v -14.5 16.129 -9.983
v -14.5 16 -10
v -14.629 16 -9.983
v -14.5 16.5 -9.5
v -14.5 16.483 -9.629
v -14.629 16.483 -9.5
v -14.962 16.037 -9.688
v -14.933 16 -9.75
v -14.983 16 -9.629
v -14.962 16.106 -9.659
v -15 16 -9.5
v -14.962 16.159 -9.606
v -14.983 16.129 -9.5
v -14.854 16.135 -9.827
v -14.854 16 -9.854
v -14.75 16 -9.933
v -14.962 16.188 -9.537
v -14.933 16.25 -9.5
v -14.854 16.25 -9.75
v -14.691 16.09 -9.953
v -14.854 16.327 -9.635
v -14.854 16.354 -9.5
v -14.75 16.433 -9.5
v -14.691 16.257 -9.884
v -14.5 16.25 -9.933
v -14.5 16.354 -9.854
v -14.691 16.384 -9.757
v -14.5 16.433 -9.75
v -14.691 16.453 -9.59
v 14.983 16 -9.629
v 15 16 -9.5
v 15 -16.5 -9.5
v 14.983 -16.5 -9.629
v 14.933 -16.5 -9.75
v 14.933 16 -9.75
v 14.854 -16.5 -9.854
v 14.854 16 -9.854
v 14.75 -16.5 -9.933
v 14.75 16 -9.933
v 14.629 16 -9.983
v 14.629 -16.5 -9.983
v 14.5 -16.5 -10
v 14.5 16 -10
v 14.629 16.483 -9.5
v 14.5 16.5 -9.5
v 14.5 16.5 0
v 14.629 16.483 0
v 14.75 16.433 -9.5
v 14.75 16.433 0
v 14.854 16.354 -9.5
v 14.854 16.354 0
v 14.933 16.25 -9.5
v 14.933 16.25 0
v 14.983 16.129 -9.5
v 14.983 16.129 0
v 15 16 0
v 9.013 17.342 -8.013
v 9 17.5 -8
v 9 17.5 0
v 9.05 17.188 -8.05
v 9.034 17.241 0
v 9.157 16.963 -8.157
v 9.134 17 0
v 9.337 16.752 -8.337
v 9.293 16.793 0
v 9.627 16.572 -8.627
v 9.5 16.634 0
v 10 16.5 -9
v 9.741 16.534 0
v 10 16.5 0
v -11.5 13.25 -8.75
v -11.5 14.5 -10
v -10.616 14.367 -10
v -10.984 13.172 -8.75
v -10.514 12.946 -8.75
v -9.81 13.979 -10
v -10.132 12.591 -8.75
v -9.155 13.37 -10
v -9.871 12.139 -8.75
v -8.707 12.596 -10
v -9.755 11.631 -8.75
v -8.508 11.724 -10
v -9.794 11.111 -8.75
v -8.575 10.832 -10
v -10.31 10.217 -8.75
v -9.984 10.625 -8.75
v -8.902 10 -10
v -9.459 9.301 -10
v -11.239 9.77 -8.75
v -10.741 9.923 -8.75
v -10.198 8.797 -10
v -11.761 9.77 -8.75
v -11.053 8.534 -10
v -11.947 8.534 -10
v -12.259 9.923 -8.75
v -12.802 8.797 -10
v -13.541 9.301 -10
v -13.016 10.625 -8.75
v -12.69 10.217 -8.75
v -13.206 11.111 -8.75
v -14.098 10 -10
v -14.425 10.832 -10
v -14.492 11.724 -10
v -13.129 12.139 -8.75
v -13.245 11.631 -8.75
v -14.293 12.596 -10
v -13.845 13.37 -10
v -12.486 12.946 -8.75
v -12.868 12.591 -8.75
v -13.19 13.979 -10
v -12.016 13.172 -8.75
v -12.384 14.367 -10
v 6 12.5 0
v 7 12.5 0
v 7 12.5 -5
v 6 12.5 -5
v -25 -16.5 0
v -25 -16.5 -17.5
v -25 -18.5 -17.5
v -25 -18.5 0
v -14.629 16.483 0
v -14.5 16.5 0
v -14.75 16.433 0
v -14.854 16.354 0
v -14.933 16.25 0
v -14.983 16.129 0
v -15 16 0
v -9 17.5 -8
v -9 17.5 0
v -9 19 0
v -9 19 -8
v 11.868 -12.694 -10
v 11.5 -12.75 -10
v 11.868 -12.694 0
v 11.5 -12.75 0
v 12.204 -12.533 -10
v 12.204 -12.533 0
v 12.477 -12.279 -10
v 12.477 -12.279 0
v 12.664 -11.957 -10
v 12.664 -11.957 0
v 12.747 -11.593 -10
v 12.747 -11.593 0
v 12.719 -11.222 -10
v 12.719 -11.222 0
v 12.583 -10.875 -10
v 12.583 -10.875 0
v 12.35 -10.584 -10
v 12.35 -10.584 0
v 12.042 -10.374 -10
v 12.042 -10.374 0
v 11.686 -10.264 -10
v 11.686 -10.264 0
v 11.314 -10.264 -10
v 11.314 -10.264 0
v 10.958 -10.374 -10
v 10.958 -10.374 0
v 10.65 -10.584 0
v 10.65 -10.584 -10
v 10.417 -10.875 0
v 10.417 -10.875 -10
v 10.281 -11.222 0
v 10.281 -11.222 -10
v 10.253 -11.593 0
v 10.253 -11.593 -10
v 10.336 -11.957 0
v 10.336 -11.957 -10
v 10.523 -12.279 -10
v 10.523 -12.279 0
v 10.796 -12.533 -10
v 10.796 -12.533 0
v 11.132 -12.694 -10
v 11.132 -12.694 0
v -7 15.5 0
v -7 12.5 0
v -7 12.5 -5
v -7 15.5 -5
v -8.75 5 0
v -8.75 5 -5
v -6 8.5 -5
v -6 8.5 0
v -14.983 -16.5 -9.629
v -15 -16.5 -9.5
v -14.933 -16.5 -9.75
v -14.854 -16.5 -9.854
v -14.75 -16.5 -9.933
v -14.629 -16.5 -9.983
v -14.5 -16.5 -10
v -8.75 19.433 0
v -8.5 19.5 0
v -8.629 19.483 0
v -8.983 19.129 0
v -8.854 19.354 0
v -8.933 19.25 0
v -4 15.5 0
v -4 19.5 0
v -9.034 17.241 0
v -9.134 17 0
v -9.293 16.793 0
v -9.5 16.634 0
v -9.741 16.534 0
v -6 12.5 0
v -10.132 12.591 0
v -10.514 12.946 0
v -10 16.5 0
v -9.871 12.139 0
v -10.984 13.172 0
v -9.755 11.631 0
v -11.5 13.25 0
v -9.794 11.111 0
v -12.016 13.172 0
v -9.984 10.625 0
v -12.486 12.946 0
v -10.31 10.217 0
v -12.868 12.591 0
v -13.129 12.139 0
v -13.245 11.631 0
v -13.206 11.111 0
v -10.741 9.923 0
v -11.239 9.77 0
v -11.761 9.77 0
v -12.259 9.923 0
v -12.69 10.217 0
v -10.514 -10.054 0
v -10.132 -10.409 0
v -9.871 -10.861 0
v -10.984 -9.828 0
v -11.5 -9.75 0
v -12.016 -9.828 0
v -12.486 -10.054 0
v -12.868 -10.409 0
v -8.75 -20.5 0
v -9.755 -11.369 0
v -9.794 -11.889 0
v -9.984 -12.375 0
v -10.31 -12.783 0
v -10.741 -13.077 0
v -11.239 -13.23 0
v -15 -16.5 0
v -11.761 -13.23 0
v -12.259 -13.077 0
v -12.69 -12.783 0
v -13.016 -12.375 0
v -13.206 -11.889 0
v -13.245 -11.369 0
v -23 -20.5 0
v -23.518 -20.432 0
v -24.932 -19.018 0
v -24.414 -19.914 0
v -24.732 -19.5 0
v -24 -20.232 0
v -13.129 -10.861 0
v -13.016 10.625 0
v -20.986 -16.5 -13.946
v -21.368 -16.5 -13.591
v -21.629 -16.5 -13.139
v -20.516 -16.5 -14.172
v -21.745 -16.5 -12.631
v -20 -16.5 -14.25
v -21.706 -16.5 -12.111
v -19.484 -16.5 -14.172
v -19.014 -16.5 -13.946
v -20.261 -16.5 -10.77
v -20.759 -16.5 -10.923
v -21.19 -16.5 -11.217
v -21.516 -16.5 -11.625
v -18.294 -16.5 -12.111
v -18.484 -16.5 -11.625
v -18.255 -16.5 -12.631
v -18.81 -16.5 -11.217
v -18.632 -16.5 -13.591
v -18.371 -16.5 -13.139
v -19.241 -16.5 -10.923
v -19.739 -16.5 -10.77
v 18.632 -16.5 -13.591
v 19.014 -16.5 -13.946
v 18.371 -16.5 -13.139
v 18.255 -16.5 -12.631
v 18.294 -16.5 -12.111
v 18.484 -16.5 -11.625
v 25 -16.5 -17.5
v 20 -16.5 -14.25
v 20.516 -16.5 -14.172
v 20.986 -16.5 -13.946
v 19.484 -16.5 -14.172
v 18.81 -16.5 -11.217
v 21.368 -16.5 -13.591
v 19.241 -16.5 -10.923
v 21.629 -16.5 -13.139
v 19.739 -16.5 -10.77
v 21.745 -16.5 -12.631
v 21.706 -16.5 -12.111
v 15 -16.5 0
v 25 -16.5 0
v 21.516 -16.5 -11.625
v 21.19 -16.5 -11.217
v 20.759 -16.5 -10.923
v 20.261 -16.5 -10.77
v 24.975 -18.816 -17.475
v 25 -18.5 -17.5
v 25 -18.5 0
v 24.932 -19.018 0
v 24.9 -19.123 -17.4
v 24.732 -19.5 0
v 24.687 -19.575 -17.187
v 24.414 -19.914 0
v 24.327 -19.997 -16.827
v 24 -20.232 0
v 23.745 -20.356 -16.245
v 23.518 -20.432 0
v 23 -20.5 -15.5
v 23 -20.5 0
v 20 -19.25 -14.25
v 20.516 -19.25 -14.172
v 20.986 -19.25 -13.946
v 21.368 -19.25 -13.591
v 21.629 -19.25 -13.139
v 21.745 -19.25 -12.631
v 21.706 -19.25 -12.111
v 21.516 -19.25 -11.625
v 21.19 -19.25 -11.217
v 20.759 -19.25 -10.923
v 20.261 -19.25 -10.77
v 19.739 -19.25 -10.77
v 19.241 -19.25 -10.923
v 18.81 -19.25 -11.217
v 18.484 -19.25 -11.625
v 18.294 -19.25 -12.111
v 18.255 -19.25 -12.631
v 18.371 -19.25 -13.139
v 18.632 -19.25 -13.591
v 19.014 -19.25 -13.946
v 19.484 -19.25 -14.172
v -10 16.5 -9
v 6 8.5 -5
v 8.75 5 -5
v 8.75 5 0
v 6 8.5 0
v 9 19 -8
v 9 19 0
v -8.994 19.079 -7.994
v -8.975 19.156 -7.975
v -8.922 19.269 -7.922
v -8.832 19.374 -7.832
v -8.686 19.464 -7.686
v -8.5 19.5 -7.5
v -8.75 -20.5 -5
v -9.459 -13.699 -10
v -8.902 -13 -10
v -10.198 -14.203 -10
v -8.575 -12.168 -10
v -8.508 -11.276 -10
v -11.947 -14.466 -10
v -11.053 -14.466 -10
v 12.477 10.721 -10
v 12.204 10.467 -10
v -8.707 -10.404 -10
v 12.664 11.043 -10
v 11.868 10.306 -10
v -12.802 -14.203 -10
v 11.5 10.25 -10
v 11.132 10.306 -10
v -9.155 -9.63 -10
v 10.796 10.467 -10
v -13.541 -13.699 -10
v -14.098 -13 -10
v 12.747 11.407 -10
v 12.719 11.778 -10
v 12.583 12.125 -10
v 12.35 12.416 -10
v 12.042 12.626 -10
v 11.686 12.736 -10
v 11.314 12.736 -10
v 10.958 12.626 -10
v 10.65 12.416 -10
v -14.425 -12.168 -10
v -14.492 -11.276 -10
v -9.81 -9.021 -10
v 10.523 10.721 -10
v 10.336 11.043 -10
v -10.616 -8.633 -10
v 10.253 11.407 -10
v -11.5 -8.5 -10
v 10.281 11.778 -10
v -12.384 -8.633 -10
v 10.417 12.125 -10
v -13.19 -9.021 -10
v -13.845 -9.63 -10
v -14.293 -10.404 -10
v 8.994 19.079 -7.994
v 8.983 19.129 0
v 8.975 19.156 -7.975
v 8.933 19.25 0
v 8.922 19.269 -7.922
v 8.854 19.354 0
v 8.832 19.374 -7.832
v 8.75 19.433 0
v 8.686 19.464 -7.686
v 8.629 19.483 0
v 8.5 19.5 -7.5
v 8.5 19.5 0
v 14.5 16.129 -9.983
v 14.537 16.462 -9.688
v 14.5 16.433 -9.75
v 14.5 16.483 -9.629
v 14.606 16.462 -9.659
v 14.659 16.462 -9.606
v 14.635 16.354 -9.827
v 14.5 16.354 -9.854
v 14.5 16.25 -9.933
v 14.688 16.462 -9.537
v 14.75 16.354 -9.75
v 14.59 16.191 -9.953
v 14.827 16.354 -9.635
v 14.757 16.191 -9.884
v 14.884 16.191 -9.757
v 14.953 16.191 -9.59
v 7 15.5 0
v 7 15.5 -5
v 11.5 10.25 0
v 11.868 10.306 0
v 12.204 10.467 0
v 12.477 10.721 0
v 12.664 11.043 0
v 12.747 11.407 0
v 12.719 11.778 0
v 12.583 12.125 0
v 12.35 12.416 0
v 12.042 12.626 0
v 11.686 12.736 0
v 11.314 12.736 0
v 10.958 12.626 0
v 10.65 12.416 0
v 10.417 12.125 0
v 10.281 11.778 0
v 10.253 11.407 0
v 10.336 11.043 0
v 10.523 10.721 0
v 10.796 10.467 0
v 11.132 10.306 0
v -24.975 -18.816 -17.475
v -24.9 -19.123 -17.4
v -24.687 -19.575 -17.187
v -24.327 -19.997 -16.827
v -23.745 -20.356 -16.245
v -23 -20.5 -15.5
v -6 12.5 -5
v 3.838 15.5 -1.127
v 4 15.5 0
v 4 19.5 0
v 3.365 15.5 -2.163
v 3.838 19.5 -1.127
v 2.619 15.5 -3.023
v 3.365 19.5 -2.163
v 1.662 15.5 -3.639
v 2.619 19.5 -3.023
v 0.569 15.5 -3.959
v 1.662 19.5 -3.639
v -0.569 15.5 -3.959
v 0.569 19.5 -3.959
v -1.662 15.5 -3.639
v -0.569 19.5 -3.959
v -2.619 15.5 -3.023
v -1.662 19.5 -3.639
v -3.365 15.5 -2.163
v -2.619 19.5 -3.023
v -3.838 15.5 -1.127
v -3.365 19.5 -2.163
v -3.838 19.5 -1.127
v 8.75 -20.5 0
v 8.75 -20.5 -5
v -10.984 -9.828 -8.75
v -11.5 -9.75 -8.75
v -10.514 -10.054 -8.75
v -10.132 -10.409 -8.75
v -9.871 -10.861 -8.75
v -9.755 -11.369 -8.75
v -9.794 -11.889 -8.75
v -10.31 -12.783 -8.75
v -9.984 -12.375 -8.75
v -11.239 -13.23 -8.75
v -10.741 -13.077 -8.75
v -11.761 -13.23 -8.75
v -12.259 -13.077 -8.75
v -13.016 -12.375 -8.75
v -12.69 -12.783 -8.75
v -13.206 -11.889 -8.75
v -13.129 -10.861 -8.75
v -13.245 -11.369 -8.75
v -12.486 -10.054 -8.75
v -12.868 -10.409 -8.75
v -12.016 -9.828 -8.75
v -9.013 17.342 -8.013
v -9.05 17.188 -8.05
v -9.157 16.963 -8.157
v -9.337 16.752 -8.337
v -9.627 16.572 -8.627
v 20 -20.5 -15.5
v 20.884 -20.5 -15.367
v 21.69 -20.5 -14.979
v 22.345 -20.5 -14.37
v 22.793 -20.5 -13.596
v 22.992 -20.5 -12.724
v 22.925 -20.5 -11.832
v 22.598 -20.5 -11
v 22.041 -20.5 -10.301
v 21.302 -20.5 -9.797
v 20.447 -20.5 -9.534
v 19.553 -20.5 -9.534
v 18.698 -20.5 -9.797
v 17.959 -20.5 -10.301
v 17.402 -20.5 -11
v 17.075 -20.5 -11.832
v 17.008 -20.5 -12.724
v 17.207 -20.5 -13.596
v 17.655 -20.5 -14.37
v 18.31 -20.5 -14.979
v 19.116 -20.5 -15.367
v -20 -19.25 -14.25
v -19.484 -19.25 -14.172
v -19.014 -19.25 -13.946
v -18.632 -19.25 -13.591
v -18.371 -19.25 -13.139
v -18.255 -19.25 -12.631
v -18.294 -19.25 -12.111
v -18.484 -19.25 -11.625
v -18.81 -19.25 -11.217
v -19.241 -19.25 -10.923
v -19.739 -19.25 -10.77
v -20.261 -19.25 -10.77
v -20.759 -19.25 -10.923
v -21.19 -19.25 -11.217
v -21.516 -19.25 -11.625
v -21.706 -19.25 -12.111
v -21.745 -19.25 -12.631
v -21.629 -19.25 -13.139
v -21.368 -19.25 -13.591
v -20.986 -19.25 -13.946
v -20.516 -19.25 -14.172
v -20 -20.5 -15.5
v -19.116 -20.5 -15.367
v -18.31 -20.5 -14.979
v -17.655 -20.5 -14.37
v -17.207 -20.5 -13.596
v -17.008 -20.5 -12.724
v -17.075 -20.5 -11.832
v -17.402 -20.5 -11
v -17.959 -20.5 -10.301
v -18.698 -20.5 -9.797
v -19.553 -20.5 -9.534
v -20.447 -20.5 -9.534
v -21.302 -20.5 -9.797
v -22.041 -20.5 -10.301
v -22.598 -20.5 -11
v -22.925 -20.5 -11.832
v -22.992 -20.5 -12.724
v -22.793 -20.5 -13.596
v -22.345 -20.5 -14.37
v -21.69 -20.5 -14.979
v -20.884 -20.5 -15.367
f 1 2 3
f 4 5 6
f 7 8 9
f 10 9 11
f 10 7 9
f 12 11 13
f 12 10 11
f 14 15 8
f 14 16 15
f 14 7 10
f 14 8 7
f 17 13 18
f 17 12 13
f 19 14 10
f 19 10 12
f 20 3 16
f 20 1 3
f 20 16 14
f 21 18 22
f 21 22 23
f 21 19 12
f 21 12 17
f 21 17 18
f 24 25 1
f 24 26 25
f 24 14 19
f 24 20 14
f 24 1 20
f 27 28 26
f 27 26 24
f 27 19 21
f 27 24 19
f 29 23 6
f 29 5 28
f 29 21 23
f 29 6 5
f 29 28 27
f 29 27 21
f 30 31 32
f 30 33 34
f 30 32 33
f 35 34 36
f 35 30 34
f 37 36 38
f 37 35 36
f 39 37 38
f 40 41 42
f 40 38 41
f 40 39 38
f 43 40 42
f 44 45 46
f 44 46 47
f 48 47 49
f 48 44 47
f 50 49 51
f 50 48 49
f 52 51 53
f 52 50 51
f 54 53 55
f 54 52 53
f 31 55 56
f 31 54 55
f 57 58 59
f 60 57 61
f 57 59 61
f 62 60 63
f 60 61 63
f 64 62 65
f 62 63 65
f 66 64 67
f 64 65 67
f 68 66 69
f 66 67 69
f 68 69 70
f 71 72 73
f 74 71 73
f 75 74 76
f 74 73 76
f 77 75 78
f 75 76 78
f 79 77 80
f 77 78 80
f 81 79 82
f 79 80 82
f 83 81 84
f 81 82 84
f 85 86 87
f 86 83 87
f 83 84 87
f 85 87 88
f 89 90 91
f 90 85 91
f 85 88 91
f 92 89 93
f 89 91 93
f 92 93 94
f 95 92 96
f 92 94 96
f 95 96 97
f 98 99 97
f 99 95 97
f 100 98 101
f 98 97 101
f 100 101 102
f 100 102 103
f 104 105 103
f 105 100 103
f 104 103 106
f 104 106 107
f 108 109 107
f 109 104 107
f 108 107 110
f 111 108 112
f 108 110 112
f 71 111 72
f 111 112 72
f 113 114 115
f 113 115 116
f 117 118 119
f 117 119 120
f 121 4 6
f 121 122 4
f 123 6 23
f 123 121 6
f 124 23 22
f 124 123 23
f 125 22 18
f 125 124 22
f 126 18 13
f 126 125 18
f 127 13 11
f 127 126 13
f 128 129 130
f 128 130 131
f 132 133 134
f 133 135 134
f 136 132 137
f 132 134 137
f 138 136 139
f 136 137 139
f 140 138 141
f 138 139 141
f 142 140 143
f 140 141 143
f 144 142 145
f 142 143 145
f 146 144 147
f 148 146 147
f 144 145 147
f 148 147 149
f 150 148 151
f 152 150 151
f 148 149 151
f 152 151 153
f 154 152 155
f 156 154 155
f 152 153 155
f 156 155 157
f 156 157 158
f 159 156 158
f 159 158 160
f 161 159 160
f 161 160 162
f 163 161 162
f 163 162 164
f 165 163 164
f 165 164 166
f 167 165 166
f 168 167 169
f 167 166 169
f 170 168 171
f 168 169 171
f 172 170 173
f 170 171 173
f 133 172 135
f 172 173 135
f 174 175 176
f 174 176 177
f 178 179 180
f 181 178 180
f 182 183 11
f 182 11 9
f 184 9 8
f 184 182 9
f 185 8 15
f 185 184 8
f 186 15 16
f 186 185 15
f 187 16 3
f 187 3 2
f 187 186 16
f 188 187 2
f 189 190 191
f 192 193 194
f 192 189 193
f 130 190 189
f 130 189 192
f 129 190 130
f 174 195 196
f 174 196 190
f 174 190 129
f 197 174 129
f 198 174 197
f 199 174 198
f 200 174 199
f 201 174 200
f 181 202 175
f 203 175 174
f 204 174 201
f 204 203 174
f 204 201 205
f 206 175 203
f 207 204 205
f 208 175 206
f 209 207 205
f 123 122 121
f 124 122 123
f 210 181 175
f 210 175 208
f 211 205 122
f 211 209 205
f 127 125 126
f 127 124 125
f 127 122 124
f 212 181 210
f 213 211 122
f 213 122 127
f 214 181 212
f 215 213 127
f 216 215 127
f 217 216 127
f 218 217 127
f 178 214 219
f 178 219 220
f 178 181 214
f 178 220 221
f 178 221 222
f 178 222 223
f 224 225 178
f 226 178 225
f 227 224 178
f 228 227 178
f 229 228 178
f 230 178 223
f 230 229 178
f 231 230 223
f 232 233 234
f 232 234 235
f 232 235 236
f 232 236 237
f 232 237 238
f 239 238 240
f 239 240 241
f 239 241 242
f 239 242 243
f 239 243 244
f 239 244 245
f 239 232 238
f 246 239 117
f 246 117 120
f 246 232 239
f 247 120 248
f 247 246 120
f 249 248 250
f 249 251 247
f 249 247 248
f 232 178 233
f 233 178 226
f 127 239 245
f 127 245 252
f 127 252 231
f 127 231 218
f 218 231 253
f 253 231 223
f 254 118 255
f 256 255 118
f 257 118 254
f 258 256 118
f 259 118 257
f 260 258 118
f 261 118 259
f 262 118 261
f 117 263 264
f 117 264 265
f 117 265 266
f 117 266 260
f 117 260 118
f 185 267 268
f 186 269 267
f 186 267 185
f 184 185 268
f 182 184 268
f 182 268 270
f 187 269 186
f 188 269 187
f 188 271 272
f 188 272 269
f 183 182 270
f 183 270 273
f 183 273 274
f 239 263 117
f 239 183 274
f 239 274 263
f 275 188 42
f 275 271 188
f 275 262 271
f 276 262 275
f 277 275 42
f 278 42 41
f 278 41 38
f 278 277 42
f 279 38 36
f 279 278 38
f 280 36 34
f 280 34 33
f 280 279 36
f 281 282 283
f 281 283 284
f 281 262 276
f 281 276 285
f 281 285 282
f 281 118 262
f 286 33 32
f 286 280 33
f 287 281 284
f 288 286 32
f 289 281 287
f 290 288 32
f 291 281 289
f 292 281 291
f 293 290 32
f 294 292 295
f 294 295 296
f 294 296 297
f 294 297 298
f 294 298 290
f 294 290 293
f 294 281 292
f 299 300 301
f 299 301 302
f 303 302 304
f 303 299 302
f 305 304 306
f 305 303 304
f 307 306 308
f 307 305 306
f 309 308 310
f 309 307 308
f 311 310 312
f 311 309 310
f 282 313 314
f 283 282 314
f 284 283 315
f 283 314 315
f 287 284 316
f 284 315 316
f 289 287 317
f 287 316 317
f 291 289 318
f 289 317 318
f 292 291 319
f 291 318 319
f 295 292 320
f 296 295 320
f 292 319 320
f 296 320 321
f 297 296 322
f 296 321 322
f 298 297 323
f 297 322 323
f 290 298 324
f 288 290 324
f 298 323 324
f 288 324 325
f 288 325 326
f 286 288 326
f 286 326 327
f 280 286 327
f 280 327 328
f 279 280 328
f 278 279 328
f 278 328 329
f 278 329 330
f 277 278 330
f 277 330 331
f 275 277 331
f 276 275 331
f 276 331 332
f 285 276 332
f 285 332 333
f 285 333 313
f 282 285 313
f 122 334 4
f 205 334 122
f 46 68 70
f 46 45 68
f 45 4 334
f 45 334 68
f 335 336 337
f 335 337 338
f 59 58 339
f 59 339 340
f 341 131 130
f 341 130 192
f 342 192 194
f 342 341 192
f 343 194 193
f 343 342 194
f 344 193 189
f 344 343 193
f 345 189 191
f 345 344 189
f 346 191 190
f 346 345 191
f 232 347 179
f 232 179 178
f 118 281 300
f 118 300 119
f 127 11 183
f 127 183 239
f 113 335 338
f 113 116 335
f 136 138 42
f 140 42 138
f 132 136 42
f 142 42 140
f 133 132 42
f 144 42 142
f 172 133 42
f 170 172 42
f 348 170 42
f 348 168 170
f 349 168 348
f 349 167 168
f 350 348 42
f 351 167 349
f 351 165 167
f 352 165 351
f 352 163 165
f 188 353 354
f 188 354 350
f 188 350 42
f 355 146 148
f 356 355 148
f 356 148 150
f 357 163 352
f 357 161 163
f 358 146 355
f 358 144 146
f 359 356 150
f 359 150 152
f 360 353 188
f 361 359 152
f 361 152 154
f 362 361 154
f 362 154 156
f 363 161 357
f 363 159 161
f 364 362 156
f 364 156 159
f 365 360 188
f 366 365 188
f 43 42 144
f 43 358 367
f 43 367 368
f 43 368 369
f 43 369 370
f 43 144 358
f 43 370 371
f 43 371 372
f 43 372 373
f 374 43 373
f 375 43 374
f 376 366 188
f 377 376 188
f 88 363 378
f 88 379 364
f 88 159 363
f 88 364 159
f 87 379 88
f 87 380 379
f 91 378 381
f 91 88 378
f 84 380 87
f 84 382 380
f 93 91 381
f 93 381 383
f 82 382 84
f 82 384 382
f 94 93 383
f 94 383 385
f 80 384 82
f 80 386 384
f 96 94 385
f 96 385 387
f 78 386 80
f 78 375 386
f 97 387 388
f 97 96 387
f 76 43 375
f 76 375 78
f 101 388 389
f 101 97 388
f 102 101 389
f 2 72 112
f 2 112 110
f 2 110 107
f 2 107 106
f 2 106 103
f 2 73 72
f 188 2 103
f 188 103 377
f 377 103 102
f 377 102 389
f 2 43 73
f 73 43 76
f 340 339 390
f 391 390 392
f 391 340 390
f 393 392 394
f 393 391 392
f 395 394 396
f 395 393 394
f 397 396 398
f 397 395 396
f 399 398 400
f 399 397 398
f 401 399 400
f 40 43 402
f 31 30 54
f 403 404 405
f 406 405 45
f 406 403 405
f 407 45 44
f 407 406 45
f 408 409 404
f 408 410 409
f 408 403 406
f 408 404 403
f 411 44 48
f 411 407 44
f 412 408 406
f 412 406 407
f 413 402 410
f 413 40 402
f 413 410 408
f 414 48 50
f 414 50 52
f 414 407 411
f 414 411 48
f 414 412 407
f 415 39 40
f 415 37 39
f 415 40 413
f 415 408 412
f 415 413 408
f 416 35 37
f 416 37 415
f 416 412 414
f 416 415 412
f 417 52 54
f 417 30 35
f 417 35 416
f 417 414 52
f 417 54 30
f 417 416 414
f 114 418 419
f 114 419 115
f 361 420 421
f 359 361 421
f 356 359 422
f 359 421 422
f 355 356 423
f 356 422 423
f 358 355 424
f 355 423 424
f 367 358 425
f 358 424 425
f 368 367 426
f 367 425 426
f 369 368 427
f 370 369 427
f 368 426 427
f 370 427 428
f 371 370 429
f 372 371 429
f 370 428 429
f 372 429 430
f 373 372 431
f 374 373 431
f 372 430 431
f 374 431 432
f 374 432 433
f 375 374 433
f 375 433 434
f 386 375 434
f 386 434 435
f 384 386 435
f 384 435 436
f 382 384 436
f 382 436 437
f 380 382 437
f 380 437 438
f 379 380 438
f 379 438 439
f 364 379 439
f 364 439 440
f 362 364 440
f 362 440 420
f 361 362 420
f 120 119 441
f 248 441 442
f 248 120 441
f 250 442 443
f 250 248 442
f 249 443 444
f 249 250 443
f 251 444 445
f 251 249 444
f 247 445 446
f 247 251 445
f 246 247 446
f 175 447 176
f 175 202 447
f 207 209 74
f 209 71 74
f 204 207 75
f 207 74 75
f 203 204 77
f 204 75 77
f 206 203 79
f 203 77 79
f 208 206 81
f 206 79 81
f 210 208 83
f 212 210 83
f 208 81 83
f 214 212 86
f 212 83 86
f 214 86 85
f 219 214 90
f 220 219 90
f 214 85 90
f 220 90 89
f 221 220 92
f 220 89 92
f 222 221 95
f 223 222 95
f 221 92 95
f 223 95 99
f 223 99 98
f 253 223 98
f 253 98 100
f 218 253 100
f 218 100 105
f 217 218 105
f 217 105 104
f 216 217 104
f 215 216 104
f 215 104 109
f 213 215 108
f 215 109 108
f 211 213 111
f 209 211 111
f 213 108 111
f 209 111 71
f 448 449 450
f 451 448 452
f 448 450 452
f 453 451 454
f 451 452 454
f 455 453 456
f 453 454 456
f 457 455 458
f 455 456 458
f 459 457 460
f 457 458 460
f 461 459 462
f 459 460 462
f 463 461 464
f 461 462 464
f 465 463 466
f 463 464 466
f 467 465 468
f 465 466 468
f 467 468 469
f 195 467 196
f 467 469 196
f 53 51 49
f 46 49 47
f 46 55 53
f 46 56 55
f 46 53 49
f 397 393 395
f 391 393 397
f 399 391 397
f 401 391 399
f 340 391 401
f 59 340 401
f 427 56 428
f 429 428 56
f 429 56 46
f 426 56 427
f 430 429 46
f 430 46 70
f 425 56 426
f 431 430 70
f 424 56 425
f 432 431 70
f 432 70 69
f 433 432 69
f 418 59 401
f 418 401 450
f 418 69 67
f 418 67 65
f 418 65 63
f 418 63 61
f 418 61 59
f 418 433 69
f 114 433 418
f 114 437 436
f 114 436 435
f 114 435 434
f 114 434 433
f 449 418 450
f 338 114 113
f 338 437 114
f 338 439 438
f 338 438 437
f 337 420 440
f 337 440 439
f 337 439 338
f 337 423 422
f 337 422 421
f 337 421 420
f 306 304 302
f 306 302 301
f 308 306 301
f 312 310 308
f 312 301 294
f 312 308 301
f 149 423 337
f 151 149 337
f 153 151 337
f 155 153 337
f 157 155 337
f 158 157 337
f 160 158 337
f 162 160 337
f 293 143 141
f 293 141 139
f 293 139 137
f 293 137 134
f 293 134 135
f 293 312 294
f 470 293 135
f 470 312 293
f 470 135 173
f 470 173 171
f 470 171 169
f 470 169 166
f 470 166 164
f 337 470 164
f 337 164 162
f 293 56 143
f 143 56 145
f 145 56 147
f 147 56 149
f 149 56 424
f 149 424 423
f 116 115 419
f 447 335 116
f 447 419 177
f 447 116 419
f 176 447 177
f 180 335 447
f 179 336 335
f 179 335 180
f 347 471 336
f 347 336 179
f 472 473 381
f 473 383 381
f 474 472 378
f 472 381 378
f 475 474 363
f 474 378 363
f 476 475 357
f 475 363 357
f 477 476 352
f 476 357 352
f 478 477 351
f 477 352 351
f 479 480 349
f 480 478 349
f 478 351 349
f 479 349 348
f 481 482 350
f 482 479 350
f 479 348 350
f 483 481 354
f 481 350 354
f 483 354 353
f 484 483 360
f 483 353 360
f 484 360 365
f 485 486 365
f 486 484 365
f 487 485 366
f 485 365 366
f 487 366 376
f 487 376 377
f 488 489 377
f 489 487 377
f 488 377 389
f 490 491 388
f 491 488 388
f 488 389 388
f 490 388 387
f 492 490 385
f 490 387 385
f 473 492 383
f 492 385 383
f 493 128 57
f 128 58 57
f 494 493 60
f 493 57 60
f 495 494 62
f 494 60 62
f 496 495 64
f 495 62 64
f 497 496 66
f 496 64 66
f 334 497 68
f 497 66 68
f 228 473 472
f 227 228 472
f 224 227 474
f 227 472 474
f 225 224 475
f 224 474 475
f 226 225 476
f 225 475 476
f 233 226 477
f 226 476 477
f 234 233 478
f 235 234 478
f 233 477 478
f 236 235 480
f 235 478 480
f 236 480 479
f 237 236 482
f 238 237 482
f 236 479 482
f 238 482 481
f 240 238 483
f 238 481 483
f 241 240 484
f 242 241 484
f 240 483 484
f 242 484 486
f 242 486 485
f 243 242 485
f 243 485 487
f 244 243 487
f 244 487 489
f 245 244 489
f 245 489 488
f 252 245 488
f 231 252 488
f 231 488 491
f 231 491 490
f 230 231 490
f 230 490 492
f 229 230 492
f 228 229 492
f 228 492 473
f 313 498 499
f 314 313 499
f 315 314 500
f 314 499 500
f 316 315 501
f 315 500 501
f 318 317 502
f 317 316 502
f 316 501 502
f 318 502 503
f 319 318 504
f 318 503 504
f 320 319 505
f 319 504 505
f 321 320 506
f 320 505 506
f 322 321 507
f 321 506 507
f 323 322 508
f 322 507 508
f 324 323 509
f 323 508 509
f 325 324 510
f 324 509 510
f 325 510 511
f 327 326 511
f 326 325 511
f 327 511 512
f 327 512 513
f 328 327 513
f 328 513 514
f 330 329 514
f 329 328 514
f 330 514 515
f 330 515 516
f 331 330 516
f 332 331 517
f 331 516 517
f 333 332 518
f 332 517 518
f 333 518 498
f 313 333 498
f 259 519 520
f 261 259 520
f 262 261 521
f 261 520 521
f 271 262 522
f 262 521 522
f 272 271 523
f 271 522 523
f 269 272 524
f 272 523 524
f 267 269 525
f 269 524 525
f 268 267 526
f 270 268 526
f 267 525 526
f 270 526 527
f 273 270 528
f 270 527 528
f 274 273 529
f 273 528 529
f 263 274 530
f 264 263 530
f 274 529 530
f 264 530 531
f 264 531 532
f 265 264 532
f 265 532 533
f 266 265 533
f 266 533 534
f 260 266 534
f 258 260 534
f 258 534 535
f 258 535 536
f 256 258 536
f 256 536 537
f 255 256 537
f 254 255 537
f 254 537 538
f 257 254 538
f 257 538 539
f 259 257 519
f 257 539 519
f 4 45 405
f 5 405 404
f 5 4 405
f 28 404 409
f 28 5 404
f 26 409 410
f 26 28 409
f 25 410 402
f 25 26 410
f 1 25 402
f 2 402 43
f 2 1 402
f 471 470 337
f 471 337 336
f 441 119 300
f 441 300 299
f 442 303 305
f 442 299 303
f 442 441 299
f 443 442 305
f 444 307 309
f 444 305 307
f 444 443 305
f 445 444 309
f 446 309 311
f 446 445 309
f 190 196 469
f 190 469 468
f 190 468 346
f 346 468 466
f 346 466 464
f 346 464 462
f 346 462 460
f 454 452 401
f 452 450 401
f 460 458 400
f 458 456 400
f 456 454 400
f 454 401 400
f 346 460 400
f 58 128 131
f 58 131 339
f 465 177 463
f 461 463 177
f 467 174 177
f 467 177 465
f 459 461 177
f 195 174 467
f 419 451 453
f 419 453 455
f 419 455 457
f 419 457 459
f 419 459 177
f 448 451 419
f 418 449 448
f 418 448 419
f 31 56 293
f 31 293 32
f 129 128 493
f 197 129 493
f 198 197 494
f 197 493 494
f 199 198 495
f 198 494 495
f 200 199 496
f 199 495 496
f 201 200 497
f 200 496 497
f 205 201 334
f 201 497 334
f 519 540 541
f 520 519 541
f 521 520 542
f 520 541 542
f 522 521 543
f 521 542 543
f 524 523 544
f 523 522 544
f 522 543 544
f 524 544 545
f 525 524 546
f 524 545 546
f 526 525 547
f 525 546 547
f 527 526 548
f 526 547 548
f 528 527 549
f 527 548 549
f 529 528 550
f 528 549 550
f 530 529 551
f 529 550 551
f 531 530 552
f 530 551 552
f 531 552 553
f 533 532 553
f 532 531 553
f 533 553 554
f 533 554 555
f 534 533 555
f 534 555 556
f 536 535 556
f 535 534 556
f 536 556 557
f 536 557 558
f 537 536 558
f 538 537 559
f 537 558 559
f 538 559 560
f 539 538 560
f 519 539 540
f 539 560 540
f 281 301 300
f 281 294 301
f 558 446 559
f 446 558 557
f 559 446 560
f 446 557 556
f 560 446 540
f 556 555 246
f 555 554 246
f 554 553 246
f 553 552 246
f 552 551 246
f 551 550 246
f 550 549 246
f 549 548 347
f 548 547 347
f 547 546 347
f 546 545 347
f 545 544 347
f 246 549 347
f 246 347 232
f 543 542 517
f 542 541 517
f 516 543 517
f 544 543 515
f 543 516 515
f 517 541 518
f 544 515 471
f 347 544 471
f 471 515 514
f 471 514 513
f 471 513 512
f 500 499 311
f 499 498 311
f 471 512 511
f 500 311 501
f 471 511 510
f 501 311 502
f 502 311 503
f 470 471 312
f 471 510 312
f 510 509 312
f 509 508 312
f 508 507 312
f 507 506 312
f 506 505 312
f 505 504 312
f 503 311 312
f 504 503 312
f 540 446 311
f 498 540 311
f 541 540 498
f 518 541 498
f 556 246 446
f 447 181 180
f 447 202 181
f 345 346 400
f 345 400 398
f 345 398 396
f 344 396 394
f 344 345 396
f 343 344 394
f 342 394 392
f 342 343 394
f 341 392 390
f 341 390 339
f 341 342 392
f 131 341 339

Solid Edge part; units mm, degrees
sketch "Sketch1" plane through (0, 0, 0) normal (0, -1, 0) x (1, 0, 0)
  line L0 (-15, 10) -> (15, 10)
  line L1 (15, 10) -> (15, -10)
  line L2 (15, -10) -> (-15, -10)
  line L3 (-15, -10) -> (-15, 10)
  dimension "D1" = 20
  dimension "D2" = 30
extrude "Protrusion1" add sketch "Sketch1" along normal mid plane 33
sketch "Sketch2" plane through (0, -16.5, 0) normal (0, -1, 0) x (1, 0, 0)
  line L0 (-25, 17.5) -> (25, 17.5)
  line L1 (25, 17.5) -> (25, -17.5)
  line L2 (25, -17.5) -> (-25, -17.5)
  line L3 (-25, -17.5) -> (-25, 17.5)
  dimension "D1" = 50
  dimension "D2" = 35
extrude "Ausprägung_2" add sketch "Sketch2" along normal blind 4
sketch "Sketch3" plane through (0, -20.5, 0) normal (0, -1, 0) x (1, 0, 0)
  line L0 (-8.75, 5) -> (8.75, 5)
  line L1 (8.75, 5) -> (8.75, -5)
  line L2 (8.75, -5) -> (-8.75, -5)
  line L3 (-8.75, -5) -> (-8.75, 5)
  dimension "D1" = 17.5
  dimension "D2" = 10
extrude "Ausschnitt_1" cut sketch "Sketch3" against normal blind 9
sketch "Sketch4" plane through (0, -11.5, 0) normal (0, -1, 0) x (1, 0, 0)
  line L0 (-8.75, 5) -> (8.75, 5)
  line L1 (8.75, 5) -> (8.75, -5)
  line L2 (8.75, -5) -> (-8.75, -5)
  line L3 (-8.75, -5) -> (-8.75, 5)
  dimension "D1" = 17.5
  dimension "D2" = 10
extrude "Ausschnitt_2" cut sketch "Sketch4" against normal blind 20
sketch "Sketch5" plane through (0, 16.5, 0) normal (0, 1, 0) x (-1, 0, 0)
  line L0 (6, 5) -> (6, -5)
  line L1 (6, -5) -> (-6, -5)
  line L2 (-6, -5) -> (-6, 5)
  line L3 (-6, 5) -> (6, 5)
  dimension "D1" = 10
  dimension "D2" = 12
extrude "Ausschnitt_3" cut sketch "Sketch5" against normal blind 8
sketch "Sketch6" plane through (0, -20.5, 0) normal (0, -1, 0) x (1, 0, 0)
  line L0 (-37.3753, 23.8002) -> (37.3753, 23.8002)
  line L1 (37.3753, 23.8002) -> (37.3753, 0)
  line L2 (37.3753, 0) -> (-37.3753, 0)
  line L3 (-37.3753, 0) -> (-37.3753, 23.8002)
extrude "Ausschnitt_4" cut sketch "Sketch6" against normal blind 187.325
hole "Bohrung_1" at (20, -20.5, -12.5) direction (0, 1, 0) diameter 3.5 end up to next countersink diameter 6 countersink angle 90
hole "Hole1" at (-20, -20.5, -12.5) direction (0, 1, 0) diameter 3.5 end up to next countersink diameter 6 countersink angle 90
hole "Bohrung_3" at (11.5, -11.5, 0) direction (0, 0, -1) diameter 2.5 end through all
hole "Hole2" at (11.5, 11.5, 0) direction (0, 0, -1) diameter 2.5 end through all
hole "Bohrung_5" at (-11.5, 11.5, -10) direction (0, 0, 1) diameter 3.5 end up to next countersink diameter 6 countersink angle 90
hole "Hole3" at (-11.5, -11.5, -10) direction (0, 0, 1) diameter 3.5 end up to next countersink diameter 6 countersink angle 90
fillet "Verrundung_2" radius 2 3 edges at (25, -20.5, -8.75) (0, -20.5, -17.5) (-25, -20.5, -8.75)
fillet "Verrundung_3" radius 0.5 5 edges at (15, 0, -10) (0, 16.5, -10) (-15, 0, -10) (-15, 16.5, -5) (15, 16.5, -5)
sketch "Sketch7" plane through (-15.5, -2, 0) normal (0, 0, 1) x (1, 0, 0)
  line L0 (8.5, 17.5) -> (9.5, 17.5)
  line L1 (9.5, 17.5) -> (9.5, 14.5)
  line L2 (9.5, 14.5) -> (8.5, 14.5)
  line L3 (8.5, 14.5) -> (8.5, 17.5)
  dimension "D1" = 4
  dimension "D2" = 3
  dimension "D3" = 1
extrude "Ausschnitt_6" cut sketch "Sketch7" against normal blind 5
sketch "Sketch8" plane through (15.5, -2, 0) normal (0, 0, 1) x (1, 0, 0)
  line L0 (-9.5, 17.5) -> (-8.5, 17.5)
  line L1 (-8.5, 17.5) -> (-8.5, 14.5)
  line L2 (-8.5, 14.5) -> (-9.5, 14.5)
  line L3 (-9.5, 14.5) -> (-9.5, 17.5)
  dimension "D1" = 4
  dimension "D2" = 3
  dimension "D3" = 1
extrude "Ausschnitt_7" cut sketch "Sketch8" against normal blind 5
sketch "Sketch9" plane through (0, 16.5, -4.75) normal (0, 1, 0) x (1, 0, 0)
  line L0 (-9, 3.25) -> (-6, 3.25)
  line L1 (-6, 3.25) -> (-6, -4.75)
  line L2 (-6, -4.75) -> (-9, -4.75)
  line L3 (-9, -4.75) -> (-9, 3.25)
  dimension "D1" = 3
  dimension "D2" = 8
extrude "Ausprägung_3" add sketch "Sketch9" along normal blind 3
sketch "Sketch10" plane through (0, 16.5, -4.75) normal (0, 1, 0) x (1, 0, 0)
  line L0 (6, 3.25) -> (9, 3.25)
  line L1 (9, 3.25) -> (9, -4.75)
  line L2 (9, -4.75) -> (6, -4.75)
  line L3 (6, -4.75) -> (6, 3.25)
  dimension "D1" = 3
  dimension "D2" = 8
extrude "Ausprägung_4" add sketch "Sketch10" along normal blind 3
sketch "Sketch11" plane through (0, 16.5, -4.75) normal (0, 1, 0) x (1, 0, 0)
  line L0 (-6, 3.25) -> (6, 3.25)
  line L1 (6, 3.25) -> (6, 0.25)
  line L2 (6, 0.25) -> (-6, 0.25)
  line L3 (-6, 0.25) -> (-6, 3.25)
  dimension "D1" = 12
  dimension "D2" = 3
extrude "Ausprägung_5" add sketch "Sketch11" along normal blind 3
fillet "Verrundung_4" radius 1 3 edges at (0, 16.5, -8) (-9, 16.5, -4) (9, 16.5, -4)
fillet "Verrundung_5" radius 0.5 3 edges at (0, 19.5, -8) (-9, 19.5, -4) (9, 19.5, -4)
sketch "Sketch12" plane through (0, -0.5, -5) normal (0, 0, 1) x (0, -1, 0)
  line L0 (-9, 8.75) -> (-5.5, 8.75)
  line L1 (-5.5, 8.75) -> (-9, 6)
  line L2 (-9, 6) -> (-9, 8.75)
  dimension "D1" = 3.5
extrude "Ausprägung_6" add sketch "Sketch12" along normal blind 5
sketch "Sketch13" plane through (0, -0.5, -5) normal (0, 0, 1) x (0, -1, 0)
  line L0 (-9, -8.75) -> (-5.5, -8.75)
  line L1 (-5.5, -8.75) -> (-9, -6)
  line L2 (-9, -6) -> (-9, -8.75)
  dimension "D1" = 3.5
extrude "Ausprägung_7" add sketch "Sketch13" along normal blind 5
sketch "Sketch14" plane through (0, -0.5, -5) normal (0, 0, 1) x (0, -1, 0)
  line L0 (-20, 6) -> (-16, 6)
  line L1 (-16, 6) -> (-16, -6)
  line L2 (-16, -6) -> (-20, -6)
  line L3 (-20, -6) -> (-20, 6)
  dimension "D1" = 4
extrude "Ausprägung_9" add sketch "Sketch14" along normal blind 10
hole "Bohrung_7" at (0, 19.5, 0) direction (0, -1, 0) diameter 8 end up to next
sketch "Sketch15" plane through (0, 19.5, -1.25) normal (0, 1, 0) x (0, 0, 1)
  line L0 (1.25, 6) -> (6.25, 6)
  line L1 (6.25, 6) -> (6.25, -6)
  line L2 (6.25, -6) -> (1.25, -6)
  line L3 (1.25, -6) -> (1.25, 6)
extrude "Ausschnitt_8" cut sketch "Sketch15" against normal blind 244.475
